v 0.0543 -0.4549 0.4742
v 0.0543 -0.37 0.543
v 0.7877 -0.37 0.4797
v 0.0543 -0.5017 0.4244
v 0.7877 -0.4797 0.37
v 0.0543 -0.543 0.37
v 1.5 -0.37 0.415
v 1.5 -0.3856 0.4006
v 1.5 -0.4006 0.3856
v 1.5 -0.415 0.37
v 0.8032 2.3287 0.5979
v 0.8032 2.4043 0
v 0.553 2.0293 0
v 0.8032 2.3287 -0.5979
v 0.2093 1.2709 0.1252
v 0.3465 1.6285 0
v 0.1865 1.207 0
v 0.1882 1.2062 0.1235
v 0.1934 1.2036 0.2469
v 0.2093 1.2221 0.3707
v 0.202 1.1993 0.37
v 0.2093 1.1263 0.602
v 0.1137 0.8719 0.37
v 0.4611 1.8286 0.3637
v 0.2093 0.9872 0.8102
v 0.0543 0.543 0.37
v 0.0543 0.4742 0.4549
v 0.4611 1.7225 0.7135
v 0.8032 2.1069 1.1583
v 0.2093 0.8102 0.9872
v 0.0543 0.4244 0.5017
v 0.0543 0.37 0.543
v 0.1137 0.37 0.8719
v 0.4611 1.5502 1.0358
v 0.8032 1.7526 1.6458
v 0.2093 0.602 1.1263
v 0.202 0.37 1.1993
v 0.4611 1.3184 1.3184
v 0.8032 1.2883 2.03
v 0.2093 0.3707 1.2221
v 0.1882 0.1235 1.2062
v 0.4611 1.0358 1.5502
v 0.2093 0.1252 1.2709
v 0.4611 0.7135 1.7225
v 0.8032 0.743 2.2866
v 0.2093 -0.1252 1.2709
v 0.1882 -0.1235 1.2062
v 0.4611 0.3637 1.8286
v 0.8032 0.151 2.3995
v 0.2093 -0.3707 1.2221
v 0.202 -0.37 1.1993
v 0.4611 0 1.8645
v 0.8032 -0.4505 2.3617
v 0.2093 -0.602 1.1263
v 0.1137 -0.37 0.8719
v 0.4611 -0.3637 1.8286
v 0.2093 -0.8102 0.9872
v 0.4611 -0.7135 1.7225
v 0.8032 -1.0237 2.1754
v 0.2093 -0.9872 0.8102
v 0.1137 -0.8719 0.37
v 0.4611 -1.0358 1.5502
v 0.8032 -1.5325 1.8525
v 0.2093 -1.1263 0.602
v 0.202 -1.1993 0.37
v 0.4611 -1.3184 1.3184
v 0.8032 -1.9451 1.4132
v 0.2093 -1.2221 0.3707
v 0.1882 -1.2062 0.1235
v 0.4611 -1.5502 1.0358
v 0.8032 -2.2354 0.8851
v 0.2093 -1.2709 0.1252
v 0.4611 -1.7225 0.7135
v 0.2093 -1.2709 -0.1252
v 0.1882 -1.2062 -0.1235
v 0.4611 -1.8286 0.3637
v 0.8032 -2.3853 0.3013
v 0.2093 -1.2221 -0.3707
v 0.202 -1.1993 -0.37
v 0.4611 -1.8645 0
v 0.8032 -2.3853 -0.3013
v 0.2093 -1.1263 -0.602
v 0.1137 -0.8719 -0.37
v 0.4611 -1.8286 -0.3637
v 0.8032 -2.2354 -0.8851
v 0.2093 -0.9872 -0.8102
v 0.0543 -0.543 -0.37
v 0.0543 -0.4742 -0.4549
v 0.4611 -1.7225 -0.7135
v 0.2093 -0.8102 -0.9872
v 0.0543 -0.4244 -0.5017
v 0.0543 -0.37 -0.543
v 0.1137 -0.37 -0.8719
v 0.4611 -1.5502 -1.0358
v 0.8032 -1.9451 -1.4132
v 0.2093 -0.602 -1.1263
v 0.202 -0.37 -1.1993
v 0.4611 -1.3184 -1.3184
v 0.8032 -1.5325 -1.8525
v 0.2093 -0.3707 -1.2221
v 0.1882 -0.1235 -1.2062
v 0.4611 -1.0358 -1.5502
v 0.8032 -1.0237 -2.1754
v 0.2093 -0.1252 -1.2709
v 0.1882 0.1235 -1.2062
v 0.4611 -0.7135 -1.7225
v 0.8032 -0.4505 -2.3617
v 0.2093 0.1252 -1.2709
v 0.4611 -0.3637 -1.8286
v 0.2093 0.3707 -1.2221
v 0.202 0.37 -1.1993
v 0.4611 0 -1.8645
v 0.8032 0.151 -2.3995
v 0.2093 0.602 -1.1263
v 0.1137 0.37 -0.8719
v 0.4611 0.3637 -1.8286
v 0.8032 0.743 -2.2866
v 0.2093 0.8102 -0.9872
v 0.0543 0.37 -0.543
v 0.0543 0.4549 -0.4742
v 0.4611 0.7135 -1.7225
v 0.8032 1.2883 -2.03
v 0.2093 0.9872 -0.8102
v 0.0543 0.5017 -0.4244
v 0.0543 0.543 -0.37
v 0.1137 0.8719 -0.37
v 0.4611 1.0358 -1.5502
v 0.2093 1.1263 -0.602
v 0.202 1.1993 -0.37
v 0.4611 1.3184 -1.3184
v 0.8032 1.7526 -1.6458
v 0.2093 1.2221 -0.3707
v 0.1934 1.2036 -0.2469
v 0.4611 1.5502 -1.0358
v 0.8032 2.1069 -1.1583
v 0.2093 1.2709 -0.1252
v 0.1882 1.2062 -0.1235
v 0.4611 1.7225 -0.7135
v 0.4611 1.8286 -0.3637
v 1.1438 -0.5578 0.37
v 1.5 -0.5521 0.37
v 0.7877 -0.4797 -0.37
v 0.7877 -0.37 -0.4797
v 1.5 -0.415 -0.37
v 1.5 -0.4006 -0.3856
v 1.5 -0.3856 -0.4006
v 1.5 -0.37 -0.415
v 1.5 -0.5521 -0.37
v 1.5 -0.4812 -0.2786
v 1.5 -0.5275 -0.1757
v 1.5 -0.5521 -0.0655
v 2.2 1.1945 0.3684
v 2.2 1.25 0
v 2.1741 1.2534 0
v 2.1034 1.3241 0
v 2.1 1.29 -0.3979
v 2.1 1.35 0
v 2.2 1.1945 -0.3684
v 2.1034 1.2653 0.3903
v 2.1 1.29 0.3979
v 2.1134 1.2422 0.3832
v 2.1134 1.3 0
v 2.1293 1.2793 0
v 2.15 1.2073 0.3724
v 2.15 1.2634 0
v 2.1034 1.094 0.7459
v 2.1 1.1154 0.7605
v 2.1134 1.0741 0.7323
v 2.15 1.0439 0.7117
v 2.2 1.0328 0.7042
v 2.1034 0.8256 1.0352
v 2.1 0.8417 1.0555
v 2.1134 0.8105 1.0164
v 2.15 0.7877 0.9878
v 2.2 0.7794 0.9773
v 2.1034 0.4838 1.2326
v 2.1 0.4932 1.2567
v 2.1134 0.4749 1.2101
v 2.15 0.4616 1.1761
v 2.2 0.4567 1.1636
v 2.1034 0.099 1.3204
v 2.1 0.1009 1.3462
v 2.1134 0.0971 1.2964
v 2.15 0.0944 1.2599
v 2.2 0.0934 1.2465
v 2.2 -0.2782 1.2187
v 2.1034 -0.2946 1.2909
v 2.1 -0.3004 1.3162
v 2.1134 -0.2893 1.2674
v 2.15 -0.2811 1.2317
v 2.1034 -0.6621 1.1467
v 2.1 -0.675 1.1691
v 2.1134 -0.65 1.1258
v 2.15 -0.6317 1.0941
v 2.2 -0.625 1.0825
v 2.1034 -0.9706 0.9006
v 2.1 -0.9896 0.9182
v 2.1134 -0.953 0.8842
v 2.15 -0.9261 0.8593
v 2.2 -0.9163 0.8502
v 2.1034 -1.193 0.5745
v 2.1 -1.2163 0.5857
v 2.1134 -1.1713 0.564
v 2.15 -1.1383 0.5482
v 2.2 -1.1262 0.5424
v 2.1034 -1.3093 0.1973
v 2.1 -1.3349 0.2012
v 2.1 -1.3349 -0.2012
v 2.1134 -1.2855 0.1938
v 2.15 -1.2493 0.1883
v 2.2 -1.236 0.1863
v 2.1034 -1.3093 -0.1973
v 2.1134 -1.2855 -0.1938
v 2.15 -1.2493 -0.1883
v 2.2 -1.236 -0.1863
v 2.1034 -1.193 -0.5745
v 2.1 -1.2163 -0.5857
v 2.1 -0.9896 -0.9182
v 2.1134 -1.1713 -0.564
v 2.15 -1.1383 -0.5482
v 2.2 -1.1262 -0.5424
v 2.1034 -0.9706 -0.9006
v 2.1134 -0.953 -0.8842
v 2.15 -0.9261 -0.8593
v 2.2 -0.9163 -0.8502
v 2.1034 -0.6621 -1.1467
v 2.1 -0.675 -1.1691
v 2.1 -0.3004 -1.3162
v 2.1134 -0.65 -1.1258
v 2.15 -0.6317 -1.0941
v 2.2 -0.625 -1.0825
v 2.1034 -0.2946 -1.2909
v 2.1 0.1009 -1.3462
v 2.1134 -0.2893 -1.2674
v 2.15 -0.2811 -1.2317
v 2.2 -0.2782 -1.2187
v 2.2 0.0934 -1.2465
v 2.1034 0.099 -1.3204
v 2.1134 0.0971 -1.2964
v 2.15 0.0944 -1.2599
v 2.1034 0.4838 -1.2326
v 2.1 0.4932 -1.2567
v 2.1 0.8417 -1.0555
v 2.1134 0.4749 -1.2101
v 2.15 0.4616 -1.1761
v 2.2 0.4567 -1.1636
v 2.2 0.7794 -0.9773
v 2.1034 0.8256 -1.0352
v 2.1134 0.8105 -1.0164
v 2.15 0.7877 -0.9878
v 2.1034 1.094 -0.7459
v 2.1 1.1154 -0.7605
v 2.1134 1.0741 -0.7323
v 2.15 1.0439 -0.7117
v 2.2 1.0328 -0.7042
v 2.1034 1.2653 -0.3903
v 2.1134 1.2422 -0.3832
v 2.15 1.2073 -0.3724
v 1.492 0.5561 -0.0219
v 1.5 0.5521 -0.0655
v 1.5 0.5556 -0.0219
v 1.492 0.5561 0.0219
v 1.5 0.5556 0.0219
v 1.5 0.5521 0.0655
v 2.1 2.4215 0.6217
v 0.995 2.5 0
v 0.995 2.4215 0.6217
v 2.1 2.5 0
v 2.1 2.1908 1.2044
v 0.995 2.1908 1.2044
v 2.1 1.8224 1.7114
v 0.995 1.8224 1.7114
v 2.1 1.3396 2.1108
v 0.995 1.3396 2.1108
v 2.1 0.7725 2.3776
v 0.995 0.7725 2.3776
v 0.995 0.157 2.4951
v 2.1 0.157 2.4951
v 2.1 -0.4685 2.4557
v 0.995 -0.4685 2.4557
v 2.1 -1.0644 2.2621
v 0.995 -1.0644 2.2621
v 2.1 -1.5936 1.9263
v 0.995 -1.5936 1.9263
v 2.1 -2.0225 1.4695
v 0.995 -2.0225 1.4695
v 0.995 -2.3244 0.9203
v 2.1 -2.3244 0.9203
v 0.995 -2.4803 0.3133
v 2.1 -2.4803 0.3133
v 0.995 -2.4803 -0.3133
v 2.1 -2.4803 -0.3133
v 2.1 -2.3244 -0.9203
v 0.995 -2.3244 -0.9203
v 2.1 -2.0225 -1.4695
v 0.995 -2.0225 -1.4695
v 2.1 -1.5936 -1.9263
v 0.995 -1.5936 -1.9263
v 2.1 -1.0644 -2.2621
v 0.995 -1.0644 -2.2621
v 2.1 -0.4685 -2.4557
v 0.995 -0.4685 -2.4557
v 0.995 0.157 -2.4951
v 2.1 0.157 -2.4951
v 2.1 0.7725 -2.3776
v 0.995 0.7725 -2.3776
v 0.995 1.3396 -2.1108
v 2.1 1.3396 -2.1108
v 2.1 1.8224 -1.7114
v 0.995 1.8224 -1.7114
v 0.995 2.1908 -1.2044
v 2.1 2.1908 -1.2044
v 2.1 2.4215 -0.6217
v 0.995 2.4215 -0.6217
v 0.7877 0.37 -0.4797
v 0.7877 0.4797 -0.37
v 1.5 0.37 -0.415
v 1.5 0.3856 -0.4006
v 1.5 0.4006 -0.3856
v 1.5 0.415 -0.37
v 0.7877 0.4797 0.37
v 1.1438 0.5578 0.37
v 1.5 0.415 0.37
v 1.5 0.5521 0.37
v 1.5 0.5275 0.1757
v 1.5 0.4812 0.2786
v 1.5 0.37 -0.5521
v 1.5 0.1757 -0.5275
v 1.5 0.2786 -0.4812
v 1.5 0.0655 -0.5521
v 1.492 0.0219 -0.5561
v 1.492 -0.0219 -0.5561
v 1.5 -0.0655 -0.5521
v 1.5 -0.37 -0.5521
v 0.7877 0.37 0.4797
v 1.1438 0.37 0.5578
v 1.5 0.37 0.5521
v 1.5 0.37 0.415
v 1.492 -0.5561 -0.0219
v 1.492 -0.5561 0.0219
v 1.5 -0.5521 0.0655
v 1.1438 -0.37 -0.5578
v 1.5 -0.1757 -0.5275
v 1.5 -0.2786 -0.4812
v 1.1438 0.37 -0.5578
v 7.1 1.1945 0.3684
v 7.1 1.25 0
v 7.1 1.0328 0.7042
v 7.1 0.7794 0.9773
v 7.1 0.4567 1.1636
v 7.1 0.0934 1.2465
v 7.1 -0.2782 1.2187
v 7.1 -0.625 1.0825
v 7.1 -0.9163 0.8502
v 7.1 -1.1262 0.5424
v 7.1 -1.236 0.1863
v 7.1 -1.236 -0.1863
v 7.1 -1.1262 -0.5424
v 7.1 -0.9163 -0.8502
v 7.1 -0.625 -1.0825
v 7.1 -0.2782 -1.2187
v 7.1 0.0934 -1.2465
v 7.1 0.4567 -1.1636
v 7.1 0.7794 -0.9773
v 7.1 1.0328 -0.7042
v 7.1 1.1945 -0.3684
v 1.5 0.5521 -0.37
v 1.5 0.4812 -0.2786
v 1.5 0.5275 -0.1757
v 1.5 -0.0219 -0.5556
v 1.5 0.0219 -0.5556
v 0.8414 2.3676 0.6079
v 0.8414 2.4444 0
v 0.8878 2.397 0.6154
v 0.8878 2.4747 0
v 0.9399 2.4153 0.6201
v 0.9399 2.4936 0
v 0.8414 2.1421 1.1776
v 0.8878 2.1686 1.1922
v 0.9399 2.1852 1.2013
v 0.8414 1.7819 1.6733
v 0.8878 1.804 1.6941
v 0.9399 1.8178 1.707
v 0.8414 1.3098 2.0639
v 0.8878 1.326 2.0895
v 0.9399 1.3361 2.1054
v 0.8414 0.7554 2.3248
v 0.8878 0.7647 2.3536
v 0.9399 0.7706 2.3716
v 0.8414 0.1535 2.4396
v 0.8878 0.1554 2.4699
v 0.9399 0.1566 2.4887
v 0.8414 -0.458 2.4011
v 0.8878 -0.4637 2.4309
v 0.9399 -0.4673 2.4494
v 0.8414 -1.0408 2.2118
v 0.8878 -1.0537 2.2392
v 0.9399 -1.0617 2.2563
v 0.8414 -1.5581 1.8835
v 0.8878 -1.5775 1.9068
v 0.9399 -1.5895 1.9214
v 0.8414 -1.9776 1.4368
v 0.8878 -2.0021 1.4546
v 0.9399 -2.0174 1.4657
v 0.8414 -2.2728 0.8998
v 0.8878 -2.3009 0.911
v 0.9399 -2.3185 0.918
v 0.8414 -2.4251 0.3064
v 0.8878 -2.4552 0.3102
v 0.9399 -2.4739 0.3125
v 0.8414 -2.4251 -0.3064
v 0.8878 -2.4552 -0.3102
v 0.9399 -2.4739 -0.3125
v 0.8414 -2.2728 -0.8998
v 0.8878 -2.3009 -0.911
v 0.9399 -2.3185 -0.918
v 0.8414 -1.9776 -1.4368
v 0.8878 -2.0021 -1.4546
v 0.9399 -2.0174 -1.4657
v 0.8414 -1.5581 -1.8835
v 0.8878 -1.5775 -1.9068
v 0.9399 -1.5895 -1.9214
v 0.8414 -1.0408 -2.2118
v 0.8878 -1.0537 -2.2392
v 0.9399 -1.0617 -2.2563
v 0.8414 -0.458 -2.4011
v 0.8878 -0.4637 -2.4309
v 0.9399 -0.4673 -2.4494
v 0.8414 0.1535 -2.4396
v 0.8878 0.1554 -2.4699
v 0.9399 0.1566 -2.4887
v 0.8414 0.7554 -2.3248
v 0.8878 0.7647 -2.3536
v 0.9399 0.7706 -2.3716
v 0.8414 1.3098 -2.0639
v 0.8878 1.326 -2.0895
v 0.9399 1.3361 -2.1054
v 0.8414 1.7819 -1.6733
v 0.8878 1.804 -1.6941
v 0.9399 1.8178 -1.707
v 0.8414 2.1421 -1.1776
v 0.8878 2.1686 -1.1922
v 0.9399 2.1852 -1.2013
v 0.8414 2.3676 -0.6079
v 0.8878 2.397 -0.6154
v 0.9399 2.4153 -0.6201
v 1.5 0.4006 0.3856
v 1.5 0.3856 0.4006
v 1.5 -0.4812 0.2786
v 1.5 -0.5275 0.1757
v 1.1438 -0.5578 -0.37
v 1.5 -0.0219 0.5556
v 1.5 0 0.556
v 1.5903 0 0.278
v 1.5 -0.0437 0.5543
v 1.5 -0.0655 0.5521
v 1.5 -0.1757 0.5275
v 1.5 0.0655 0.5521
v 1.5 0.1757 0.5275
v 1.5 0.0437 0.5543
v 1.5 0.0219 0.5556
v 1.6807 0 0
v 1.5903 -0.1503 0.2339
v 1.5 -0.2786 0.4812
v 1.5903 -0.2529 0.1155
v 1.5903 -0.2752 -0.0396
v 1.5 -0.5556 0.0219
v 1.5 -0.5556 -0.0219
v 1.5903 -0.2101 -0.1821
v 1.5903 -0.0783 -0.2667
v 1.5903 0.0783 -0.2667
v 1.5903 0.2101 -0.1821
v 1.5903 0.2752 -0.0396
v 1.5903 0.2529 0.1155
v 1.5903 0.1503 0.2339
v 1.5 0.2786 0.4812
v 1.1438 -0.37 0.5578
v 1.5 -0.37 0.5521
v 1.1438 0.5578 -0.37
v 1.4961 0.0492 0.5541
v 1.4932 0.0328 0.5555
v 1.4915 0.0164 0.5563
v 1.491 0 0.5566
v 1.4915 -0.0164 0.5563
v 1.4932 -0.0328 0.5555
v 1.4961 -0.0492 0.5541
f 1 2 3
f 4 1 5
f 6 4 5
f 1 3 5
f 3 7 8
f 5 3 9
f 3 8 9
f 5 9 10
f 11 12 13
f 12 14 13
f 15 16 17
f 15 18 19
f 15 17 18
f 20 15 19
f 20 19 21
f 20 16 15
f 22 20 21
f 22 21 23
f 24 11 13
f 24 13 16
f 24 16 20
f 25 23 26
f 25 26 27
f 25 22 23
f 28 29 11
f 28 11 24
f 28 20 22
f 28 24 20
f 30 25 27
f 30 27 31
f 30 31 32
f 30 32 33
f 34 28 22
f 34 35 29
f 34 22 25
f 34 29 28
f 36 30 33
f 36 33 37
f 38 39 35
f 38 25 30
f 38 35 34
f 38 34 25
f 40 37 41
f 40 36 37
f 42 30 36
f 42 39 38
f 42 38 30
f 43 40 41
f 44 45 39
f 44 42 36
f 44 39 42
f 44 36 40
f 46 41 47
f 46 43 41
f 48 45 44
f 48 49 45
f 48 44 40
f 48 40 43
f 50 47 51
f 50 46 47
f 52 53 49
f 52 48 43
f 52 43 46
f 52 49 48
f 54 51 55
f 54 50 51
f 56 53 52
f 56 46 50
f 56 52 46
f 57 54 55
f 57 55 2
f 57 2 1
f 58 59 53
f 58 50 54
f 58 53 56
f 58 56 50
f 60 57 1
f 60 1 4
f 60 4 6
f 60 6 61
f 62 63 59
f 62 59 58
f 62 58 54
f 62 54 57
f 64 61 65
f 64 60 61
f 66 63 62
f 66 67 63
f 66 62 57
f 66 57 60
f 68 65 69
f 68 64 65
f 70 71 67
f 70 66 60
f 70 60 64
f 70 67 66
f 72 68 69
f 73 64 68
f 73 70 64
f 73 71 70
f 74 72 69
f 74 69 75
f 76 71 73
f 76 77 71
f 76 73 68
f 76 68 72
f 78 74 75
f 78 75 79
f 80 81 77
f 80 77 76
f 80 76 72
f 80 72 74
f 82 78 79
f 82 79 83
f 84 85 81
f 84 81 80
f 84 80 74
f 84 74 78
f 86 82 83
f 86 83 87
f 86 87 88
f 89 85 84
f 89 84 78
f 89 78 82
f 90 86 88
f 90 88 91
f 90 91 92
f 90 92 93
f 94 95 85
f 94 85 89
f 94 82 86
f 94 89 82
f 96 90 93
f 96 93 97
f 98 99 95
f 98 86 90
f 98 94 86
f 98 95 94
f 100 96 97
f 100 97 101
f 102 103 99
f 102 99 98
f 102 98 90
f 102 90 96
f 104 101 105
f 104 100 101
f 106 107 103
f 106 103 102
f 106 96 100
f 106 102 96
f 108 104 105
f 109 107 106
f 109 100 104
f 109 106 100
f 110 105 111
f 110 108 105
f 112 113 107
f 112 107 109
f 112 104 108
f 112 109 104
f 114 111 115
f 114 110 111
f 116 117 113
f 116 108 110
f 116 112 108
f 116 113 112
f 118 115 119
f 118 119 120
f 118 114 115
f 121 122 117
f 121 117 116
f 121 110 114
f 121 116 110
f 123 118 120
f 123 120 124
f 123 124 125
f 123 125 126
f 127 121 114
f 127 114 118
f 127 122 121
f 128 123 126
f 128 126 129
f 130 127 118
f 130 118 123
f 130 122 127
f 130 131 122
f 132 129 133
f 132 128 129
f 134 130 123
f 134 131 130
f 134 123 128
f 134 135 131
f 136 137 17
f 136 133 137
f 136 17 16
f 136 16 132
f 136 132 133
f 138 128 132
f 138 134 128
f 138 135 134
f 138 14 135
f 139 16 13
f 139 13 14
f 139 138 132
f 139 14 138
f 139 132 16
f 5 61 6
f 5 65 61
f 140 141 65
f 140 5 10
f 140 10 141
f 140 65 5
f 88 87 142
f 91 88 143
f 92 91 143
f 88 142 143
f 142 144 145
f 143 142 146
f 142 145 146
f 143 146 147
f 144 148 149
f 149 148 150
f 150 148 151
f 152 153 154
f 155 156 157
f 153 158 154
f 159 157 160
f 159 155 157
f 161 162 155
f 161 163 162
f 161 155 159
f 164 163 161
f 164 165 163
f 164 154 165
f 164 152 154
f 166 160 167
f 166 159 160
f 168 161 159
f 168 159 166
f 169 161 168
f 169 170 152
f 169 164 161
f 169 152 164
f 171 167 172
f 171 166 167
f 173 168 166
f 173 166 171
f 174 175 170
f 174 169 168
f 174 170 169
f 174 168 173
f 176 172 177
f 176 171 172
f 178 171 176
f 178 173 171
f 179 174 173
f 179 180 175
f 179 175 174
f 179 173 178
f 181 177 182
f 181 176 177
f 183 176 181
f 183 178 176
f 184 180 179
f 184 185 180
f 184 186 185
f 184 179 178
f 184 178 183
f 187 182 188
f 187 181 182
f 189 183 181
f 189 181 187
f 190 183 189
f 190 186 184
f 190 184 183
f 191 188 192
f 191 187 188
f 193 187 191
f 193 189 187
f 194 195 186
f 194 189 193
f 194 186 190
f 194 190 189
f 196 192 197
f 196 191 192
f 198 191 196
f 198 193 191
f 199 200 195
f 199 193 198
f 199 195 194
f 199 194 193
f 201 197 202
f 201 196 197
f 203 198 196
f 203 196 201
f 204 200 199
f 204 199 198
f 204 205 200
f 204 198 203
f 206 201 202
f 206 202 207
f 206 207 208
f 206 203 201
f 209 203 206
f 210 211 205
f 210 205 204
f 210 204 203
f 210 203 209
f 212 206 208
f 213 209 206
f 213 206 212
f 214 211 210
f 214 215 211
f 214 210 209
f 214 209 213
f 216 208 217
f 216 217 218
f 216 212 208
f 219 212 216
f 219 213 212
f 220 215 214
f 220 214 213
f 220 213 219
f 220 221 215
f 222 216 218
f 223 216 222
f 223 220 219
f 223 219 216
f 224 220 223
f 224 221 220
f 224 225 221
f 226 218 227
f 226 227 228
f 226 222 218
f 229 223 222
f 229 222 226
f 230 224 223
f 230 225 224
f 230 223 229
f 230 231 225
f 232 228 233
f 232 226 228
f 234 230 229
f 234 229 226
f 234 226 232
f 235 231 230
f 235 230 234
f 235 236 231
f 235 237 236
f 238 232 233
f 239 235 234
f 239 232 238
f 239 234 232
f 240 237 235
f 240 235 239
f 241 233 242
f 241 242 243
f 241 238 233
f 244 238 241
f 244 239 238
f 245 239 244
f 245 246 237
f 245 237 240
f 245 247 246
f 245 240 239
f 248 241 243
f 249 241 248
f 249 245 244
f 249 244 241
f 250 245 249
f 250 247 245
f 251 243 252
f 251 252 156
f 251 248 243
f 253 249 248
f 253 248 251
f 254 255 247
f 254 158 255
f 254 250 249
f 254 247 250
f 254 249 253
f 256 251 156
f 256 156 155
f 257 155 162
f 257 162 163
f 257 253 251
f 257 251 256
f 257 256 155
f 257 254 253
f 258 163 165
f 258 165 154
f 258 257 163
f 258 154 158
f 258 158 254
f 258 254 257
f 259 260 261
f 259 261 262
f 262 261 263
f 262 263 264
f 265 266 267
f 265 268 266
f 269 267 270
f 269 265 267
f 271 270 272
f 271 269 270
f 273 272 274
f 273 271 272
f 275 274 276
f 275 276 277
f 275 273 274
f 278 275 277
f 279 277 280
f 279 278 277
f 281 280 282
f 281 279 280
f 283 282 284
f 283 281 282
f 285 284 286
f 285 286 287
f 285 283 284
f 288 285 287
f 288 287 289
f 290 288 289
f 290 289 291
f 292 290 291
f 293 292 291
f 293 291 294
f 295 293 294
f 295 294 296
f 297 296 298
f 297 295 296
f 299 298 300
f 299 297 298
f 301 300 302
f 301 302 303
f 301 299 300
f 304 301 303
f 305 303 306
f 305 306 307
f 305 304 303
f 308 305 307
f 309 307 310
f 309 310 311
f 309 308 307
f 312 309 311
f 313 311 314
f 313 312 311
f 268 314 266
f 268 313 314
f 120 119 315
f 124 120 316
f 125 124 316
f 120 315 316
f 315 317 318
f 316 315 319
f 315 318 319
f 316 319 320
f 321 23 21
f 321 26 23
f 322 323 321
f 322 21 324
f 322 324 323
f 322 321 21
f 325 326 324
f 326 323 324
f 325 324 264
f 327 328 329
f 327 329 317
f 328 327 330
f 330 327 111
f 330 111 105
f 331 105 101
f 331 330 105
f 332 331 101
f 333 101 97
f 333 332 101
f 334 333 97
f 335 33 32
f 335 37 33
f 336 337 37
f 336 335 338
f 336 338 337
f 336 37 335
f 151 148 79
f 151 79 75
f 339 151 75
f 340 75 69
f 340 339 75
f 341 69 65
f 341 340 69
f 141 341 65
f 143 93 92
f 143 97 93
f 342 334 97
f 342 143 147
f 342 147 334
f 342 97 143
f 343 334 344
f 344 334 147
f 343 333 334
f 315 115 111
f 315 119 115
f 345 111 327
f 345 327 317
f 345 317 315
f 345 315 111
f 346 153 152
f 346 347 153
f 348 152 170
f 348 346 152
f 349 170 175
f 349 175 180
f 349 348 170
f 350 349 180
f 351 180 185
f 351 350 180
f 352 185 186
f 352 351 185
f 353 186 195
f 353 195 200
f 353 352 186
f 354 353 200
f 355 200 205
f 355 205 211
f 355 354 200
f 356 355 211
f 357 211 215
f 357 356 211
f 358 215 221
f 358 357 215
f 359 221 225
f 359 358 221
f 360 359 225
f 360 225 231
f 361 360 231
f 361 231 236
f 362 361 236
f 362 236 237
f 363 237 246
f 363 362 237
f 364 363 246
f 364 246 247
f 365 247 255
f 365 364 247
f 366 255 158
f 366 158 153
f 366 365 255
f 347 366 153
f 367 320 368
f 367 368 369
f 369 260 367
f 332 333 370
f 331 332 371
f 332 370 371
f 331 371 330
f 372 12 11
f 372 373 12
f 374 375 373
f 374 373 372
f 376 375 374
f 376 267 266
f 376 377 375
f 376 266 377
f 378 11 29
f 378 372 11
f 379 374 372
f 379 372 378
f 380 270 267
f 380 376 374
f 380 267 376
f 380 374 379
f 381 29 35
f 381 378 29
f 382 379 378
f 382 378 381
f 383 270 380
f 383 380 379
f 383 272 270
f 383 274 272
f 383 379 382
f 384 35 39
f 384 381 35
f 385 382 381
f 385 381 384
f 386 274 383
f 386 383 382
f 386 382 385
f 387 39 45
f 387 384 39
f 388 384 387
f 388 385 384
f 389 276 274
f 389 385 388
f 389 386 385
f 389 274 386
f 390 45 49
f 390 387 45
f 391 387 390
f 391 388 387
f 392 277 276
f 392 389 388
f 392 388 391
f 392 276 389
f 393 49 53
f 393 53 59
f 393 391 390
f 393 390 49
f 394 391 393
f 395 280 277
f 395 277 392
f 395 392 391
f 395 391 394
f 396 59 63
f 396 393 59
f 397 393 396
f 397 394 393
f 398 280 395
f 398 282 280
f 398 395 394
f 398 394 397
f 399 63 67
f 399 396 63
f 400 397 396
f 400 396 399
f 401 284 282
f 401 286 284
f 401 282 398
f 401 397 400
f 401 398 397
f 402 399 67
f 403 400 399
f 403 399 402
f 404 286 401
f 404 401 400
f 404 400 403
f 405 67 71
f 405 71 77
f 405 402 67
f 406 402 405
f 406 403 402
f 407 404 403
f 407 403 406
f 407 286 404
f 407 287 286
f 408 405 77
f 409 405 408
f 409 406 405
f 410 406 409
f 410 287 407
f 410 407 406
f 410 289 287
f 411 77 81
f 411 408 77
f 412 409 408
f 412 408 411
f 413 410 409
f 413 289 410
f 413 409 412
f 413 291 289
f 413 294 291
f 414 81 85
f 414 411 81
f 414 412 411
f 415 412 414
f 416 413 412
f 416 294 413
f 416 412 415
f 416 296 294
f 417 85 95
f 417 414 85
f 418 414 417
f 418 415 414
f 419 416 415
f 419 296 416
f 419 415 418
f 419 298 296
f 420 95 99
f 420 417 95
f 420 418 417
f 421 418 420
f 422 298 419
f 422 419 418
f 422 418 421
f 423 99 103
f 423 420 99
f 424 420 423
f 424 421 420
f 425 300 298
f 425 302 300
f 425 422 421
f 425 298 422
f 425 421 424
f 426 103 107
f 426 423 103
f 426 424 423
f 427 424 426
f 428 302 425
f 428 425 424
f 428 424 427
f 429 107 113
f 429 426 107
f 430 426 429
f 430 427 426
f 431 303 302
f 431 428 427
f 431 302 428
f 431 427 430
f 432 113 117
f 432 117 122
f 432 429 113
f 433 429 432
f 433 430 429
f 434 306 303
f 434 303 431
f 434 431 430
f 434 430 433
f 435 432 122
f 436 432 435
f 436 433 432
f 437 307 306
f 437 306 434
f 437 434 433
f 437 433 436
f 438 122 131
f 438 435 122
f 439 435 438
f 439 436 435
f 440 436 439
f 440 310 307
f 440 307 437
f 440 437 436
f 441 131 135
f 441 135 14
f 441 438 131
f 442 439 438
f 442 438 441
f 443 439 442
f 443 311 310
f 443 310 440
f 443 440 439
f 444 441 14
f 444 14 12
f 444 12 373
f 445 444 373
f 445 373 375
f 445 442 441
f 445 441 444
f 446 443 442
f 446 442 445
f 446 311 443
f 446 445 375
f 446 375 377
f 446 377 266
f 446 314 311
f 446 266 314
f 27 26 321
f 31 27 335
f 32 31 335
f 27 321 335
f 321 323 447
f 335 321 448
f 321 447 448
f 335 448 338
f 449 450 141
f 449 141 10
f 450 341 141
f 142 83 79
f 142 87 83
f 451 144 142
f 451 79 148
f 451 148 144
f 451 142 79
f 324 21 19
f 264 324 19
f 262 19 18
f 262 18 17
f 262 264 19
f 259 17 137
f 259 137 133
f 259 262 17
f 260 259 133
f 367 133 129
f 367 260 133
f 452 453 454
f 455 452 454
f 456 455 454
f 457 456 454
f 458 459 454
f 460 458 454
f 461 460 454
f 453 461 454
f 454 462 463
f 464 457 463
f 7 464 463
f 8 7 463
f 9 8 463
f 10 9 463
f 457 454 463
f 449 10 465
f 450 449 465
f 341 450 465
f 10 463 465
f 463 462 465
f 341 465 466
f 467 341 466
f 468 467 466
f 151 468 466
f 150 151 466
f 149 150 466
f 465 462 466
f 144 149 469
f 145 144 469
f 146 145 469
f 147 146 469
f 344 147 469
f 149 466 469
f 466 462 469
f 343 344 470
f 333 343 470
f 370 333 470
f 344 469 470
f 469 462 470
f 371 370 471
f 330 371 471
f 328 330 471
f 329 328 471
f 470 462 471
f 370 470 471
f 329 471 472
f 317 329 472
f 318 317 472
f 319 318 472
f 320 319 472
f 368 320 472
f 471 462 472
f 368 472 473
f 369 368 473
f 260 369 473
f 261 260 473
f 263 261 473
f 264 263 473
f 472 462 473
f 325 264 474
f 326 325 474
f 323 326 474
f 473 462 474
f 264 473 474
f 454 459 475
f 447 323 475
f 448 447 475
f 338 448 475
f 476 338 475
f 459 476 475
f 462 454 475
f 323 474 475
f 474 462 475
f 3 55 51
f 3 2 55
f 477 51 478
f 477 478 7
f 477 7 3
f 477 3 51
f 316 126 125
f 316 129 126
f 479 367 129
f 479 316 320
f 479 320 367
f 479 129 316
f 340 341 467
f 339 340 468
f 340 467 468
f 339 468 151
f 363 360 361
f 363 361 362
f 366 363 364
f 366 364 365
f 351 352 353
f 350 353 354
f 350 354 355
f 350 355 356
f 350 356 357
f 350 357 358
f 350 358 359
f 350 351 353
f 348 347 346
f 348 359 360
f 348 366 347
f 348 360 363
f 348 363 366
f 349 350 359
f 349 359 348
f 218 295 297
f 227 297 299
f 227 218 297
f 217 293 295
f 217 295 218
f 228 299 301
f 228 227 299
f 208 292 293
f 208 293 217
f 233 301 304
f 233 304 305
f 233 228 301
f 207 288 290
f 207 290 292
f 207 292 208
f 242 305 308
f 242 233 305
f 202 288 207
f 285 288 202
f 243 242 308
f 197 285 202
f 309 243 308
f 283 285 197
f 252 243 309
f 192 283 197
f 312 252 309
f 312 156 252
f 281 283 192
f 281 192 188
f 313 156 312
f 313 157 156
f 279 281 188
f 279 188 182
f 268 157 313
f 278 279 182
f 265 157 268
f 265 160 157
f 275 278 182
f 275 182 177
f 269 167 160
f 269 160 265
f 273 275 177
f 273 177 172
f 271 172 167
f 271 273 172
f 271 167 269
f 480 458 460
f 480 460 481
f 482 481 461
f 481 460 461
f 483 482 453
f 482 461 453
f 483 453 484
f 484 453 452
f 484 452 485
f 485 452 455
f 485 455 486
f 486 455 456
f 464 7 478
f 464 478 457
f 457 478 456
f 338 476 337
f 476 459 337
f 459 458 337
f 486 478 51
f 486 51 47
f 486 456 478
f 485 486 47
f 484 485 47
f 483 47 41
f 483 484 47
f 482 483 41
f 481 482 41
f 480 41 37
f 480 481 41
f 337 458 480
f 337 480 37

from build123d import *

# Parameters (mm, degrees)
RECPAT_COUNT = 2
RECPAT_ANGLE = 90


with BuildPart() as part:
    # Fillet1: read off the stored shape, not the designer's step
    # Fillet1 outline → Fillet1 (revolve)
    with BuildSketch(Plane.YX):
        with BuildLine():
            Line((1.25, 2.2), (1.25, 7.1))
            Line((1.25, 7.1), (0, 7.1))
            Line((0, 7.1), (0, 0))
            ThreePointArc((0, 0), (1.267435139, 0.206109099), (2.404255321, 0.803195916))
            ThreePointArc((2.404255321, 0.803195916), (2.474733878, 0.88781572), (2.5, 0.99500416))
            Line((2.5, 0.99500416), (2.5, 2.1))
            Line((2.5, 2.1), (1.35, 2.1))
            ThreePointArc((1.35, 2.1), (1.279289322, 2.129289322), (1.25, 2.2))
        make_face()
    revolve(axis=Axis((0, 0, 0), (1, 0, 0)))

    # Sketch3 → Recess section 0
    with BuildSketch(Plane(origin=(0, 0, 0), x_dir=(0, 0, -1), z_dir=(1, 0, 0))):
        with BuildLine():
            Line((0.37, -1.3), (-0.37, -1.3))
            Line((-0.37, -1.3), (-0.37, 1.3))
            Line((-0.37, 1.3), (0.37, 1.3))
            Line((0.37, 1.3), (0.37, -1.3))
        make_face()
    # Sketch4 → Recess section 1
    with BuildSketch(Plane(origin=(1.5, 0, 0), x_dir=(0, 0, -1), z_dir=(1, 0, 0))):
        with BuildLine():
            Line((0.37, -0.552127713), (-0.37, -0.552127713))
            Line((-0.37, -0.552127713), (-0.37, 0.552127713))
            Line((-0.37, 0.552127713), (0.37, 0.552127713))
            Line((0.37, 0.552127713), (0.37, -0.552127713))
        make_face()
    recess = loft(mode=Mode.SUBTRACT)

    # RecPat: Recess ×2 about axis
    recpat_axis = Axis((0, 0, 0), (1, 0, 0))
    for i in range(1, RECPAT_COUNT):
        add(recess.rotate(recpat_axis, i * RECPAT_ANGLE / (RECPAT_COUNT - 1)), mode=Mode.SUBTRACT)

    # RecCorSke → RecessCore (revolve, cut)
    with BuildSketch(Plane.XY, mode=Mode.PRIVATE) as recesscore_sk:
        Polygon((0, 0), (0, 0.660890218), (1.5, 0.556), (1.680655351, 0), align=None)
    revolve(recesscore_sk.sketch.rotate(Axis((-3.175, 0, 0), (1, 0, 0)), 90), axis=Axis((-3.175, 0, 0), (1, 0, 0)), mode=Mode.SUBTRACT)


solid = part.part
